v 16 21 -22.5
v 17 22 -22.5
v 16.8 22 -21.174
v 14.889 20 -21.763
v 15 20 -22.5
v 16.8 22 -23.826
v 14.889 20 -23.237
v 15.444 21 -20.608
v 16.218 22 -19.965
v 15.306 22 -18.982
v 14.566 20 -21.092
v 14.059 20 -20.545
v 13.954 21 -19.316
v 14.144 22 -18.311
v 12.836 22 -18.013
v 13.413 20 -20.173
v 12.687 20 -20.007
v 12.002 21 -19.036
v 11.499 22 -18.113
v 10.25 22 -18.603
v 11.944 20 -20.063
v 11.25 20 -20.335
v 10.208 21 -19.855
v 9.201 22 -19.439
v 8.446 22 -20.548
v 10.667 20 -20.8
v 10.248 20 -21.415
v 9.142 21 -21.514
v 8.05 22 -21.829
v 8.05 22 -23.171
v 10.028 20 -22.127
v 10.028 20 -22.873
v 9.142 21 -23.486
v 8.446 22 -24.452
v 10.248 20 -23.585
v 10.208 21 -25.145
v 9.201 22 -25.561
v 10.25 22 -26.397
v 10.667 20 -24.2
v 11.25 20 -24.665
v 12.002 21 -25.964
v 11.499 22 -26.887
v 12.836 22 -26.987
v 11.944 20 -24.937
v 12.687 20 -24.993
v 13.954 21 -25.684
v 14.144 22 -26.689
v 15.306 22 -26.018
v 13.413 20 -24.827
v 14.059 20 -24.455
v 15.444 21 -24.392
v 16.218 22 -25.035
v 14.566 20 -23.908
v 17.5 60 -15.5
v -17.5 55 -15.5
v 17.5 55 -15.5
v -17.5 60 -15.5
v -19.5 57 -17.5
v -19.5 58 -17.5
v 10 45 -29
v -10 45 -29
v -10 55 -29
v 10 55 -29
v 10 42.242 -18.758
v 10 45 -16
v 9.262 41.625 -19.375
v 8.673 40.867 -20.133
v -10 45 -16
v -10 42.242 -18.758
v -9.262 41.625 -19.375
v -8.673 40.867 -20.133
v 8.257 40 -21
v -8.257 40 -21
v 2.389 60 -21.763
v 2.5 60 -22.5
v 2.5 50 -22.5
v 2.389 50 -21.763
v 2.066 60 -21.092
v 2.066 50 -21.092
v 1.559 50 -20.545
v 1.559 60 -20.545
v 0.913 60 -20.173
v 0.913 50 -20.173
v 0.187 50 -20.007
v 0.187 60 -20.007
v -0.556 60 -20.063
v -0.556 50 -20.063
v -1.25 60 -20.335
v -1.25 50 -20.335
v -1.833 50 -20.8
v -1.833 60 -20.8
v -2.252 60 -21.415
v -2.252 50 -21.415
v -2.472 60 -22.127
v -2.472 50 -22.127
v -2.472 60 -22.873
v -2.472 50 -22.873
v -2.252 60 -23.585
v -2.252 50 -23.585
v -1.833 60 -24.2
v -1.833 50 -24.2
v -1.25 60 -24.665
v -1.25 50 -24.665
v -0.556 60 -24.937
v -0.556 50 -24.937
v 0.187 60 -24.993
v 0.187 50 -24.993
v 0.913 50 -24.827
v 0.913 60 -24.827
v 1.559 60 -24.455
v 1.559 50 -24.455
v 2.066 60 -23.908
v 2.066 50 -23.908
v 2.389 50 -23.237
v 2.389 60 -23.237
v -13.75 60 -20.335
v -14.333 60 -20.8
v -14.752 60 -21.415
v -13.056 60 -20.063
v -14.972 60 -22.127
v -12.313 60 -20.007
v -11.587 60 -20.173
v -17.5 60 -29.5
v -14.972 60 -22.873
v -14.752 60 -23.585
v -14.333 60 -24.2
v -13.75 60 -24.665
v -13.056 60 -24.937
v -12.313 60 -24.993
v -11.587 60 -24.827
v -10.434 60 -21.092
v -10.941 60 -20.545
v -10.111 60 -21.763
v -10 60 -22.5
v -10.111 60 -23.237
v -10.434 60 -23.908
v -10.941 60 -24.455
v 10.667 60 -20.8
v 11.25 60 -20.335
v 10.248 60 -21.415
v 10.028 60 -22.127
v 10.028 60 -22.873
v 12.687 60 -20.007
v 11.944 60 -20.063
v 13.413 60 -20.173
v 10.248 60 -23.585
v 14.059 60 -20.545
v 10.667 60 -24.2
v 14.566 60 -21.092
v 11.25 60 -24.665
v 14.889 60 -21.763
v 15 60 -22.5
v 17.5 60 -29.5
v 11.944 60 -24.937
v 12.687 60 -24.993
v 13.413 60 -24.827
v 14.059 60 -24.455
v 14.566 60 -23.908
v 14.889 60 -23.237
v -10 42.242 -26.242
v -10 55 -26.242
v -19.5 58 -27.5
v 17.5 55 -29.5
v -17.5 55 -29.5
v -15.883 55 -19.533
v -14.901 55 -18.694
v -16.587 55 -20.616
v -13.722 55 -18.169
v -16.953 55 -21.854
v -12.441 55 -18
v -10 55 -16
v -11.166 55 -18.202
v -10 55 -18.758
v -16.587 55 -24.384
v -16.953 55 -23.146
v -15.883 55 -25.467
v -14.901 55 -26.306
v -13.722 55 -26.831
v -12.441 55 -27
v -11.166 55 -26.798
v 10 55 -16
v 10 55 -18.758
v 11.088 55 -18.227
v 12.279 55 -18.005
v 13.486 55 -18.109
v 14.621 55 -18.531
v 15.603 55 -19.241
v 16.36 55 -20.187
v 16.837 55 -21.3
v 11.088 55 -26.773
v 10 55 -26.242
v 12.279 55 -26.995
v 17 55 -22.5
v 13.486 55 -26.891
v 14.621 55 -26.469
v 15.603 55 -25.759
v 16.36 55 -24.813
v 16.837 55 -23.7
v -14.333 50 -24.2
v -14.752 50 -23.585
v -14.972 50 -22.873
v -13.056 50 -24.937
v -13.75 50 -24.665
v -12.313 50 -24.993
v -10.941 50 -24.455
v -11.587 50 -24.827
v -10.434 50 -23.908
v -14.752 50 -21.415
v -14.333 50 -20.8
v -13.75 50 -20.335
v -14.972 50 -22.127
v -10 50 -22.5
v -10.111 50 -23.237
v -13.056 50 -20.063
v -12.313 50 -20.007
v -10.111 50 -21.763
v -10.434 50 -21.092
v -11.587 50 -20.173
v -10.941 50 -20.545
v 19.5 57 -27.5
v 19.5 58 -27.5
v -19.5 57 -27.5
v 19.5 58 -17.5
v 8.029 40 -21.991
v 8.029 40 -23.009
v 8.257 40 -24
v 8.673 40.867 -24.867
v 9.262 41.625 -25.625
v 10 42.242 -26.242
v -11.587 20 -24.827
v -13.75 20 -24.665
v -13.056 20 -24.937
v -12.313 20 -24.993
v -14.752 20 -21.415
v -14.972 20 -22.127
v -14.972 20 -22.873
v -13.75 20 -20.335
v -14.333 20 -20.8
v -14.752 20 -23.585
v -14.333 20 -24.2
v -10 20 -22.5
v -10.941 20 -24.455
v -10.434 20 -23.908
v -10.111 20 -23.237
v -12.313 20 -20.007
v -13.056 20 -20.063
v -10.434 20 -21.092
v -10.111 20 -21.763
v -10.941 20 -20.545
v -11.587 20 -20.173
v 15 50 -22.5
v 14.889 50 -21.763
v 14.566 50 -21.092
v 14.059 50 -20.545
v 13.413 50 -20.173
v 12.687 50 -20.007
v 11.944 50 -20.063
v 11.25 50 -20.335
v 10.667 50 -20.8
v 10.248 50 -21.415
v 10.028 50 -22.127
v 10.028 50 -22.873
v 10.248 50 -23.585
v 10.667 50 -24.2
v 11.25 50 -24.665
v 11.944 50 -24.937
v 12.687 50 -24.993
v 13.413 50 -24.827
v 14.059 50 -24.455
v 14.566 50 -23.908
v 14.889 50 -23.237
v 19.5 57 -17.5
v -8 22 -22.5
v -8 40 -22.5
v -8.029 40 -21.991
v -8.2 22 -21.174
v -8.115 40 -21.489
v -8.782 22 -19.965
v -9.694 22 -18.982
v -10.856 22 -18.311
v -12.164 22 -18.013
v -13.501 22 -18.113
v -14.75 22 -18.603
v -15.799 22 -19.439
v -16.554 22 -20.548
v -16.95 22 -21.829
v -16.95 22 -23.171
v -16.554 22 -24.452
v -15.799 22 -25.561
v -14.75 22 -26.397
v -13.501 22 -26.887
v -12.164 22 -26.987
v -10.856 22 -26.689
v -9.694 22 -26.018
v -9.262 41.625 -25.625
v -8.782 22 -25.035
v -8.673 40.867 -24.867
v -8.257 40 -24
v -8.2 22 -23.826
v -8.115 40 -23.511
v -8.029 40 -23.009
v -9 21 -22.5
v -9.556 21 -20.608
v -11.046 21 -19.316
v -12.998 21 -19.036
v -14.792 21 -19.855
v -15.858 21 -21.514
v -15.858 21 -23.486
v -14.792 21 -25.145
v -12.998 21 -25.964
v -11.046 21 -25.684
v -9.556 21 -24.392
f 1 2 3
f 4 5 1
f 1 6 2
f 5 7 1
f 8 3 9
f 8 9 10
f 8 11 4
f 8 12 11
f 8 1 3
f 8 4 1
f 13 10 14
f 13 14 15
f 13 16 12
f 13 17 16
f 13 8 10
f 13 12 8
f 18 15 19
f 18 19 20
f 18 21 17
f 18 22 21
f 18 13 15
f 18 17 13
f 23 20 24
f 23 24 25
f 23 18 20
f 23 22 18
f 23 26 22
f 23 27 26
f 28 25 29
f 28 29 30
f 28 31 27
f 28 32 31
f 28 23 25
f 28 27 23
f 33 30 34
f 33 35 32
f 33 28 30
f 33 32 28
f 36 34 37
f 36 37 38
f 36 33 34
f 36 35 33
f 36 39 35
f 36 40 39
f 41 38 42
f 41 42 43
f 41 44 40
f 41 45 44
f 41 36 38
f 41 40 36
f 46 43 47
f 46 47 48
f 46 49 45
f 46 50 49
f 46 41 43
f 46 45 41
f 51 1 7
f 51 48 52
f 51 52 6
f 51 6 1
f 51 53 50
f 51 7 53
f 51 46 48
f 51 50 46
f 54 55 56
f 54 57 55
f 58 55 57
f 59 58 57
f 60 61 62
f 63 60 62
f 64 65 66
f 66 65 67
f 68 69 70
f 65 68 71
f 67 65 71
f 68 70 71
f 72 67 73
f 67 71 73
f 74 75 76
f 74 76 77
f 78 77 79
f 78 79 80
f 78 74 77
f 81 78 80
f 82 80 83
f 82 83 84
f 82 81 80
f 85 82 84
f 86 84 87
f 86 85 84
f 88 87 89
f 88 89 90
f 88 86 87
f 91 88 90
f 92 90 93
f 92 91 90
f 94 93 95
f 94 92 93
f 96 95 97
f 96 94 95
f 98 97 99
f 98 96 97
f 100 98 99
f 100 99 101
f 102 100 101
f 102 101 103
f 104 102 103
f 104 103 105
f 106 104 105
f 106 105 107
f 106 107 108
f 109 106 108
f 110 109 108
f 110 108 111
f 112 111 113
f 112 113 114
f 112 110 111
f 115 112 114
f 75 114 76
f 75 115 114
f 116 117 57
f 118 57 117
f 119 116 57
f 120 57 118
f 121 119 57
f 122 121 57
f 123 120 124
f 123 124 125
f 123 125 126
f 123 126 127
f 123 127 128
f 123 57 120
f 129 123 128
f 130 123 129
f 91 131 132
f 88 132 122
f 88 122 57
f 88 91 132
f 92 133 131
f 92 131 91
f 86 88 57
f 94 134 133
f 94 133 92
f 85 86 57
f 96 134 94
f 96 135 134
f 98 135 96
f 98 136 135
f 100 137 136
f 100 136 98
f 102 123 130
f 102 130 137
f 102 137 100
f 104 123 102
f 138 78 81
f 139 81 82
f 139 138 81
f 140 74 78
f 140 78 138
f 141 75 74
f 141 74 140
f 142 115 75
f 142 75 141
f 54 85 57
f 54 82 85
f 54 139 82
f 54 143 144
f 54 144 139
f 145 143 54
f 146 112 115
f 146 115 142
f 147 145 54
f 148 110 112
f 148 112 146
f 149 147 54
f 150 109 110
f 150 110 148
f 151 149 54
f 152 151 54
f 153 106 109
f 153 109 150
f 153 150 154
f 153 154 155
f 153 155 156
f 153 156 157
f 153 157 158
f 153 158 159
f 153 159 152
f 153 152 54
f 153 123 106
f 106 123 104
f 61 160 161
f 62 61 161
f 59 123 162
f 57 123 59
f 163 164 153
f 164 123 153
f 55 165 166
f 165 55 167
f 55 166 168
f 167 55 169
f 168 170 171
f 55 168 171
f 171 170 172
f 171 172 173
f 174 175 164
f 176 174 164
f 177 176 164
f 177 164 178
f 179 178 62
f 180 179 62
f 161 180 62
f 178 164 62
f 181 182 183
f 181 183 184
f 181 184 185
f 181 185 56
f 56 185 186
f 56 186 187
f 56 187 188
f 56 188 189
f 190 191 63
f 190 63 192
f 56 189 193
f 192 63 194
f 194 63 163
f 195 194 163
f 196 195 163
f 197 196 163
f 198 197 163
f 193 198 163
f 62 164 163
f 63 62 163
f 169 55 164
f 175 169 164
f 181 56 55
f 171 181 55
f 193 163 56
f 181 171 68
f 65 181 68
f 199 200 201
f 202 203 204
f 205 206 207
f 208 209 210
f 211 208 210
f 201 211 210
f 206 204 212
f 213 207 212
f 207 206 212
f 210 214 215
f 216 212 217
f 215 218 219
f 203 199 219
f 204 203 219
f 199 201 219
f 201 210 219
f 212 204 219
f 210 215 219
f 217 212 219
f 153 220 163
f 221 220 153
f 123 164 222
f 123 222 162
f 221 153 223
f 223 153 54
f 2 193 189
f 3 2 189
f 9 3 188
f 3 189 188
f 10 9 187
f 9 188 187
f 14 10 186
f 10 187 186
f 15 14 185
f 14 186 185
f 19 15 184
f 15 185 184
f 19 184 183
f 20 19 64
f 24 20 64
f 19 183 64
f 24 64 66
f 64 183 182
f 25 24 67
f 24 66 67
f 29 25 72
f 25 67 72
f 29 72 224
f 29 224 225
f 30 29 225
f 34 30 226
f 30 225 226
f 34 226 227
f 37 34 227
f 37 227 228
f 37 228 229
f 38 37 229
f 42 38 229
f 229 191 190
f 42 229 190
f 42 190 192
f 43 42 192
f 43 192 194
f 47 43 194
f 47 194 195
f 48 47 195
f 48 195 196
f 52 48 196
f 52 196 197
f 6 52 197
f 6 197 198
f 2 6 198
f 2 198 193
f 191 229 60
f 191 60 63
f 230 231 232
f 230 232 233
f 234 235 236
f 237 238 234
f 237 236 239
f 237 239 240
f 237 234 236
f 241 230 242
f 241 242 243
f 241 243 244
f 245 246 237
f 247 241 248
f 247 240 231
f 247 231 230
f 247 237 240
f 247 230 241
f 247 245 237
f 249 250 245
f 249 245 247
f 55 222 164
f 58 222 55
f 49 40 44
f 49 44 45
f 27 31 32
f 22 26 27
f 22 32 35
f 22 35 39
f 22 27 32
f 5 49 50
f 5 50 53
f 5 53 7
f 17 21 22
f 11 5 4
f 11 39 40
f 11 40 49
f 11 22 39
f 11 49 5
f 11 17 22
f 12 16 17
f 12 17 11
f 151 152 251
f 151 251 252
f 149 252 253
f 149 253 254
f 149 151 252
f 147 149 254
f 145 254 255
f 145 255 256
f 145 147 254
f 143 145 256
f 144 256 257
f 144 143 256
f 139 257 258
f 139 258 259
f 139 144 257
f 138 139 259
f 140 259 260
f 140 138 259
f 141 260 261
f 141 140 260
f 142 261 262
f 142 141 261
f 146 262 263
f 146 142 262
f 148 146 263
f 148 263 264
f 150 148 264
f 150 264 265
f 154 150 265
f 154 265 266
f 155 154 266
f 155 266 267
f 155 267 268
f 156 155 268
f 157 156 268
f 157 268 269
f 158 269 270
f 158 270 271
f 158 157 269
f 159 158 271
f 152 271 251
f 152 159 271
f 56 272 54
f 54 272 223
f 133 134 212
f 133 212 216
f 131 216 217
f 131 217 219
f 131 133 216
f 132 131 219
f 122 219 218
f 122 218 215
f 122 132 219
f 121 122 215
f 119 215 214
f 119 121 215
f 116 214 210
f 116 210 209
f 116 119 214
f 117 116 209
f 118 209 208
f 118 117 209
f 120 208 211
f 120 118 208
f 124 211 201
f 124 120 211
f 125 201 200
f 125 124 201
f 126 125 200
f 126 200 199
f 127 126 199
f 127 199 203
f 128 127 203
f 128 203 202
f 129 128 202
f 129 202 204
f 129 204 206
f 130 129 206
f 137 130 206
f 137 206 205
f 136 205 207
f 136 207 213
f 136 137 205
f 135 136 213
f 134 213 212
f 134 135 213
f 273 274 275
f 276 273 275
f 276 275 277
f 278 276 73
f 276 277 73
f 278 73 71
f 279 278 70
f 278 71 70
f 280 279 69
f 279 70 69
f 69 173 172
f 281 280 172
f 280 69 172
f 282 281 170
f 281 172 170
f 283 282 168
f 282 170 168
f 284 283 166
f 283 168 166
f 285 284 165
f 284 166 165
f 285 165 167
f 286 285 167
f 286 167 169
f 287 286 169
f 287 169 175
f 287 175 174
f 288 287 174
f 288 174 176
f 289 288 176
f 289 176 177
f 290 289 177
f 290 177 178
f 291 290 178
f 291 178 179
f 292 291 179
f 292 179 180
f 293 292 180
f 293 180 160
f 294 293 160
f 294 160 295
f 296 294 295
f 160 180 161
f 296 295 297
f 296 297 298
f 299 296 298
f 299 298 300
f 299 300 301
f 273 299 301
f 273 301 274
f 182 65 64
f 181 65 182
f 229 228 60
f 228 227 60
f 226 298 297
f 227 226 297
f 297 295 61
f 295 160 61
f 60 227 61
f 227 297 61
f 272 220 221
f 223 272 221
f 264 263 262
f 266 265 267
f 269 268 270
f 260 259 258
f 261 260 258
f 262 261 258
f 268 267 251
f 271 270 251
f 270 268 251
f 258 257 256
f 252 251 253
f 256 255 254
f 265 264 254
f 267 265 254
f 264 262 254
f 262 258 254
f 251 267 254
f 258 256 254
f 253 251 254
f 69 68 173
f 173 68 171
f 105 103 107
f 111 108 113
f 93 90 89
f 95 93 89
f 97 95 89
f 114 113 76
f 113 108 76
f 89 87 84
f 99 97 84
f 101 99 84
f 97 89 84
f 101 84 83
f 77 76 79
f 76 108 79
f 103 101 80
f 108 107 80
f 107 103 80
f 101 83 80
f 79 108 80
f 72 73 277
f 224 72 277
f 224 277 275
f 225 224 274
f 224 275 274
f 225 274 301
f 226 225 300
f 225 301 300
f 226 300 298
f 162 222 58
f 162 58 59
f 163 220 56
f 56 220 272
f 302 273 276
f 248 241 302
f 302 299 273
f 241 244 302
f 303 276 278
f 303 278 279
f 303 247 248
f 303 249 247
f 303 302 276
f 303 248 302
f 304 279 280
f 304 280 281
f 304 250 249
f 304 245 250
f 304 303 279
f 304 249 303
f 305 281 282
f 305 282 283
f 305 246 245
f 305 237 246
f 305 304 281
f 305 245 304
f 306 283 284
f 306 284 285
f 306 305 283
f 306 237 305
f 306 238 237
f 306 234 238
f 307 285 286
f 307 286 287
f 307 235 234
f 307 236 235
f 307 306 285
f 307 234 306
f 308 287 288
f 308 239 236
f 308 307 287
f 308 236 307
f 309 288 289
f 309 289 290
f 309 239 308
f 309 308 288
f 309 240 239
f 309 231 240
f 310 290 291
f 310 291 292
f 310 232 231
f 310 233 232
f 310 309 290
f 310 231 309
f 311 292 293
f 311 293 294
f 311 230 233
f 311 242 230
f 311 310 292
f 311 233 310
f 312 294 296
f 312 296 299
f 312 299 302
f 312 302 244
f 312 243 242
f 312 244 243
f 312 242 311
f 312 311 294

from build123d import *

# Parameters (mm, degrees)
SKETCH012_W  = 39
SKETCH012_H  = 5
PAD012_DEPTH = 14
PAD013_DEPTH = 20
SKETCH014_R  = 4.5
PAD014_DEPTH = 35
CHAMFER_SIZE = 2
SKETCH015_R  = 2.5
POCKET_DEPTH = 10


with BuildPart() as part:
    # Sketch012 → Pad012 (new body)
    with BuildSketch(Plane.XY.offset(0.5)):
        with Locations((0, 52.5)):
            Rectangle(SKETCH012_W, SKETCH012_H)
    extrude(amount=PAD012_DEPTH)

    # Sketch013 → Pad013 (join)
    with BuildSketch(Plane.YZ.offset(-10)):
        Polygon((40, 14), (35, 9), (35, 6), (40, 1), (50, 1), (50, 14), align=None)
    extrude(amount=PAD013_DEPTH)

    # Sketch014 → Pad014 (join)
    with BuildSketch(Plane.XZ.offset(-50)):
        with Locations((-12.5, 7.5)):
            Circle(SKETCH014_R)
        with Locations((12.5, 7.5)):
            Circle(SKETCH014_R)
    extrude(amount=PAD014_DEPTH)

    # Chamfer
    chamfer_edges = [part.edges().sort_by_distance(p)[0] for p in [
        (8, 15, 7.5),
        (-17, 15, 7.5),
        (19.5, 50, 7.5),
        (19.5, 55, 7.5),
        (19.5, 52.5, 0.5),
        (19.5, 52.5, 14.5),
        (-19.5, 55, 7.5),
        (-19.5, 50, 7.5),
        (-19.5, 52.5, 0.5),
        (-19.5, 52.5, 14.5),
    ]]
    chamfer(chamfer_edges, length=CHAMFER_SIZE)

    # Sketch015 → Pocket (cut)
    with BuildSketch(Plane.XZ.offset(-55)):
        with Locations((-12.5, 7.5)):
            Circle(SKETCH015_R)
        with Locations((0, 7.5)):
            Circle(SKETCH015_R)
        with Locations((12.5, 7.5)):
            Circle(SKETCH015_R)
    extrude(amount=POCKET_DEPTH, mode=Mode.SUBTRACT)


with BuildPart() as part_1:
    # Body004 placement: moved
    add(part.part.moved(Location((0, 5, -30))))


solid = part_1.part
